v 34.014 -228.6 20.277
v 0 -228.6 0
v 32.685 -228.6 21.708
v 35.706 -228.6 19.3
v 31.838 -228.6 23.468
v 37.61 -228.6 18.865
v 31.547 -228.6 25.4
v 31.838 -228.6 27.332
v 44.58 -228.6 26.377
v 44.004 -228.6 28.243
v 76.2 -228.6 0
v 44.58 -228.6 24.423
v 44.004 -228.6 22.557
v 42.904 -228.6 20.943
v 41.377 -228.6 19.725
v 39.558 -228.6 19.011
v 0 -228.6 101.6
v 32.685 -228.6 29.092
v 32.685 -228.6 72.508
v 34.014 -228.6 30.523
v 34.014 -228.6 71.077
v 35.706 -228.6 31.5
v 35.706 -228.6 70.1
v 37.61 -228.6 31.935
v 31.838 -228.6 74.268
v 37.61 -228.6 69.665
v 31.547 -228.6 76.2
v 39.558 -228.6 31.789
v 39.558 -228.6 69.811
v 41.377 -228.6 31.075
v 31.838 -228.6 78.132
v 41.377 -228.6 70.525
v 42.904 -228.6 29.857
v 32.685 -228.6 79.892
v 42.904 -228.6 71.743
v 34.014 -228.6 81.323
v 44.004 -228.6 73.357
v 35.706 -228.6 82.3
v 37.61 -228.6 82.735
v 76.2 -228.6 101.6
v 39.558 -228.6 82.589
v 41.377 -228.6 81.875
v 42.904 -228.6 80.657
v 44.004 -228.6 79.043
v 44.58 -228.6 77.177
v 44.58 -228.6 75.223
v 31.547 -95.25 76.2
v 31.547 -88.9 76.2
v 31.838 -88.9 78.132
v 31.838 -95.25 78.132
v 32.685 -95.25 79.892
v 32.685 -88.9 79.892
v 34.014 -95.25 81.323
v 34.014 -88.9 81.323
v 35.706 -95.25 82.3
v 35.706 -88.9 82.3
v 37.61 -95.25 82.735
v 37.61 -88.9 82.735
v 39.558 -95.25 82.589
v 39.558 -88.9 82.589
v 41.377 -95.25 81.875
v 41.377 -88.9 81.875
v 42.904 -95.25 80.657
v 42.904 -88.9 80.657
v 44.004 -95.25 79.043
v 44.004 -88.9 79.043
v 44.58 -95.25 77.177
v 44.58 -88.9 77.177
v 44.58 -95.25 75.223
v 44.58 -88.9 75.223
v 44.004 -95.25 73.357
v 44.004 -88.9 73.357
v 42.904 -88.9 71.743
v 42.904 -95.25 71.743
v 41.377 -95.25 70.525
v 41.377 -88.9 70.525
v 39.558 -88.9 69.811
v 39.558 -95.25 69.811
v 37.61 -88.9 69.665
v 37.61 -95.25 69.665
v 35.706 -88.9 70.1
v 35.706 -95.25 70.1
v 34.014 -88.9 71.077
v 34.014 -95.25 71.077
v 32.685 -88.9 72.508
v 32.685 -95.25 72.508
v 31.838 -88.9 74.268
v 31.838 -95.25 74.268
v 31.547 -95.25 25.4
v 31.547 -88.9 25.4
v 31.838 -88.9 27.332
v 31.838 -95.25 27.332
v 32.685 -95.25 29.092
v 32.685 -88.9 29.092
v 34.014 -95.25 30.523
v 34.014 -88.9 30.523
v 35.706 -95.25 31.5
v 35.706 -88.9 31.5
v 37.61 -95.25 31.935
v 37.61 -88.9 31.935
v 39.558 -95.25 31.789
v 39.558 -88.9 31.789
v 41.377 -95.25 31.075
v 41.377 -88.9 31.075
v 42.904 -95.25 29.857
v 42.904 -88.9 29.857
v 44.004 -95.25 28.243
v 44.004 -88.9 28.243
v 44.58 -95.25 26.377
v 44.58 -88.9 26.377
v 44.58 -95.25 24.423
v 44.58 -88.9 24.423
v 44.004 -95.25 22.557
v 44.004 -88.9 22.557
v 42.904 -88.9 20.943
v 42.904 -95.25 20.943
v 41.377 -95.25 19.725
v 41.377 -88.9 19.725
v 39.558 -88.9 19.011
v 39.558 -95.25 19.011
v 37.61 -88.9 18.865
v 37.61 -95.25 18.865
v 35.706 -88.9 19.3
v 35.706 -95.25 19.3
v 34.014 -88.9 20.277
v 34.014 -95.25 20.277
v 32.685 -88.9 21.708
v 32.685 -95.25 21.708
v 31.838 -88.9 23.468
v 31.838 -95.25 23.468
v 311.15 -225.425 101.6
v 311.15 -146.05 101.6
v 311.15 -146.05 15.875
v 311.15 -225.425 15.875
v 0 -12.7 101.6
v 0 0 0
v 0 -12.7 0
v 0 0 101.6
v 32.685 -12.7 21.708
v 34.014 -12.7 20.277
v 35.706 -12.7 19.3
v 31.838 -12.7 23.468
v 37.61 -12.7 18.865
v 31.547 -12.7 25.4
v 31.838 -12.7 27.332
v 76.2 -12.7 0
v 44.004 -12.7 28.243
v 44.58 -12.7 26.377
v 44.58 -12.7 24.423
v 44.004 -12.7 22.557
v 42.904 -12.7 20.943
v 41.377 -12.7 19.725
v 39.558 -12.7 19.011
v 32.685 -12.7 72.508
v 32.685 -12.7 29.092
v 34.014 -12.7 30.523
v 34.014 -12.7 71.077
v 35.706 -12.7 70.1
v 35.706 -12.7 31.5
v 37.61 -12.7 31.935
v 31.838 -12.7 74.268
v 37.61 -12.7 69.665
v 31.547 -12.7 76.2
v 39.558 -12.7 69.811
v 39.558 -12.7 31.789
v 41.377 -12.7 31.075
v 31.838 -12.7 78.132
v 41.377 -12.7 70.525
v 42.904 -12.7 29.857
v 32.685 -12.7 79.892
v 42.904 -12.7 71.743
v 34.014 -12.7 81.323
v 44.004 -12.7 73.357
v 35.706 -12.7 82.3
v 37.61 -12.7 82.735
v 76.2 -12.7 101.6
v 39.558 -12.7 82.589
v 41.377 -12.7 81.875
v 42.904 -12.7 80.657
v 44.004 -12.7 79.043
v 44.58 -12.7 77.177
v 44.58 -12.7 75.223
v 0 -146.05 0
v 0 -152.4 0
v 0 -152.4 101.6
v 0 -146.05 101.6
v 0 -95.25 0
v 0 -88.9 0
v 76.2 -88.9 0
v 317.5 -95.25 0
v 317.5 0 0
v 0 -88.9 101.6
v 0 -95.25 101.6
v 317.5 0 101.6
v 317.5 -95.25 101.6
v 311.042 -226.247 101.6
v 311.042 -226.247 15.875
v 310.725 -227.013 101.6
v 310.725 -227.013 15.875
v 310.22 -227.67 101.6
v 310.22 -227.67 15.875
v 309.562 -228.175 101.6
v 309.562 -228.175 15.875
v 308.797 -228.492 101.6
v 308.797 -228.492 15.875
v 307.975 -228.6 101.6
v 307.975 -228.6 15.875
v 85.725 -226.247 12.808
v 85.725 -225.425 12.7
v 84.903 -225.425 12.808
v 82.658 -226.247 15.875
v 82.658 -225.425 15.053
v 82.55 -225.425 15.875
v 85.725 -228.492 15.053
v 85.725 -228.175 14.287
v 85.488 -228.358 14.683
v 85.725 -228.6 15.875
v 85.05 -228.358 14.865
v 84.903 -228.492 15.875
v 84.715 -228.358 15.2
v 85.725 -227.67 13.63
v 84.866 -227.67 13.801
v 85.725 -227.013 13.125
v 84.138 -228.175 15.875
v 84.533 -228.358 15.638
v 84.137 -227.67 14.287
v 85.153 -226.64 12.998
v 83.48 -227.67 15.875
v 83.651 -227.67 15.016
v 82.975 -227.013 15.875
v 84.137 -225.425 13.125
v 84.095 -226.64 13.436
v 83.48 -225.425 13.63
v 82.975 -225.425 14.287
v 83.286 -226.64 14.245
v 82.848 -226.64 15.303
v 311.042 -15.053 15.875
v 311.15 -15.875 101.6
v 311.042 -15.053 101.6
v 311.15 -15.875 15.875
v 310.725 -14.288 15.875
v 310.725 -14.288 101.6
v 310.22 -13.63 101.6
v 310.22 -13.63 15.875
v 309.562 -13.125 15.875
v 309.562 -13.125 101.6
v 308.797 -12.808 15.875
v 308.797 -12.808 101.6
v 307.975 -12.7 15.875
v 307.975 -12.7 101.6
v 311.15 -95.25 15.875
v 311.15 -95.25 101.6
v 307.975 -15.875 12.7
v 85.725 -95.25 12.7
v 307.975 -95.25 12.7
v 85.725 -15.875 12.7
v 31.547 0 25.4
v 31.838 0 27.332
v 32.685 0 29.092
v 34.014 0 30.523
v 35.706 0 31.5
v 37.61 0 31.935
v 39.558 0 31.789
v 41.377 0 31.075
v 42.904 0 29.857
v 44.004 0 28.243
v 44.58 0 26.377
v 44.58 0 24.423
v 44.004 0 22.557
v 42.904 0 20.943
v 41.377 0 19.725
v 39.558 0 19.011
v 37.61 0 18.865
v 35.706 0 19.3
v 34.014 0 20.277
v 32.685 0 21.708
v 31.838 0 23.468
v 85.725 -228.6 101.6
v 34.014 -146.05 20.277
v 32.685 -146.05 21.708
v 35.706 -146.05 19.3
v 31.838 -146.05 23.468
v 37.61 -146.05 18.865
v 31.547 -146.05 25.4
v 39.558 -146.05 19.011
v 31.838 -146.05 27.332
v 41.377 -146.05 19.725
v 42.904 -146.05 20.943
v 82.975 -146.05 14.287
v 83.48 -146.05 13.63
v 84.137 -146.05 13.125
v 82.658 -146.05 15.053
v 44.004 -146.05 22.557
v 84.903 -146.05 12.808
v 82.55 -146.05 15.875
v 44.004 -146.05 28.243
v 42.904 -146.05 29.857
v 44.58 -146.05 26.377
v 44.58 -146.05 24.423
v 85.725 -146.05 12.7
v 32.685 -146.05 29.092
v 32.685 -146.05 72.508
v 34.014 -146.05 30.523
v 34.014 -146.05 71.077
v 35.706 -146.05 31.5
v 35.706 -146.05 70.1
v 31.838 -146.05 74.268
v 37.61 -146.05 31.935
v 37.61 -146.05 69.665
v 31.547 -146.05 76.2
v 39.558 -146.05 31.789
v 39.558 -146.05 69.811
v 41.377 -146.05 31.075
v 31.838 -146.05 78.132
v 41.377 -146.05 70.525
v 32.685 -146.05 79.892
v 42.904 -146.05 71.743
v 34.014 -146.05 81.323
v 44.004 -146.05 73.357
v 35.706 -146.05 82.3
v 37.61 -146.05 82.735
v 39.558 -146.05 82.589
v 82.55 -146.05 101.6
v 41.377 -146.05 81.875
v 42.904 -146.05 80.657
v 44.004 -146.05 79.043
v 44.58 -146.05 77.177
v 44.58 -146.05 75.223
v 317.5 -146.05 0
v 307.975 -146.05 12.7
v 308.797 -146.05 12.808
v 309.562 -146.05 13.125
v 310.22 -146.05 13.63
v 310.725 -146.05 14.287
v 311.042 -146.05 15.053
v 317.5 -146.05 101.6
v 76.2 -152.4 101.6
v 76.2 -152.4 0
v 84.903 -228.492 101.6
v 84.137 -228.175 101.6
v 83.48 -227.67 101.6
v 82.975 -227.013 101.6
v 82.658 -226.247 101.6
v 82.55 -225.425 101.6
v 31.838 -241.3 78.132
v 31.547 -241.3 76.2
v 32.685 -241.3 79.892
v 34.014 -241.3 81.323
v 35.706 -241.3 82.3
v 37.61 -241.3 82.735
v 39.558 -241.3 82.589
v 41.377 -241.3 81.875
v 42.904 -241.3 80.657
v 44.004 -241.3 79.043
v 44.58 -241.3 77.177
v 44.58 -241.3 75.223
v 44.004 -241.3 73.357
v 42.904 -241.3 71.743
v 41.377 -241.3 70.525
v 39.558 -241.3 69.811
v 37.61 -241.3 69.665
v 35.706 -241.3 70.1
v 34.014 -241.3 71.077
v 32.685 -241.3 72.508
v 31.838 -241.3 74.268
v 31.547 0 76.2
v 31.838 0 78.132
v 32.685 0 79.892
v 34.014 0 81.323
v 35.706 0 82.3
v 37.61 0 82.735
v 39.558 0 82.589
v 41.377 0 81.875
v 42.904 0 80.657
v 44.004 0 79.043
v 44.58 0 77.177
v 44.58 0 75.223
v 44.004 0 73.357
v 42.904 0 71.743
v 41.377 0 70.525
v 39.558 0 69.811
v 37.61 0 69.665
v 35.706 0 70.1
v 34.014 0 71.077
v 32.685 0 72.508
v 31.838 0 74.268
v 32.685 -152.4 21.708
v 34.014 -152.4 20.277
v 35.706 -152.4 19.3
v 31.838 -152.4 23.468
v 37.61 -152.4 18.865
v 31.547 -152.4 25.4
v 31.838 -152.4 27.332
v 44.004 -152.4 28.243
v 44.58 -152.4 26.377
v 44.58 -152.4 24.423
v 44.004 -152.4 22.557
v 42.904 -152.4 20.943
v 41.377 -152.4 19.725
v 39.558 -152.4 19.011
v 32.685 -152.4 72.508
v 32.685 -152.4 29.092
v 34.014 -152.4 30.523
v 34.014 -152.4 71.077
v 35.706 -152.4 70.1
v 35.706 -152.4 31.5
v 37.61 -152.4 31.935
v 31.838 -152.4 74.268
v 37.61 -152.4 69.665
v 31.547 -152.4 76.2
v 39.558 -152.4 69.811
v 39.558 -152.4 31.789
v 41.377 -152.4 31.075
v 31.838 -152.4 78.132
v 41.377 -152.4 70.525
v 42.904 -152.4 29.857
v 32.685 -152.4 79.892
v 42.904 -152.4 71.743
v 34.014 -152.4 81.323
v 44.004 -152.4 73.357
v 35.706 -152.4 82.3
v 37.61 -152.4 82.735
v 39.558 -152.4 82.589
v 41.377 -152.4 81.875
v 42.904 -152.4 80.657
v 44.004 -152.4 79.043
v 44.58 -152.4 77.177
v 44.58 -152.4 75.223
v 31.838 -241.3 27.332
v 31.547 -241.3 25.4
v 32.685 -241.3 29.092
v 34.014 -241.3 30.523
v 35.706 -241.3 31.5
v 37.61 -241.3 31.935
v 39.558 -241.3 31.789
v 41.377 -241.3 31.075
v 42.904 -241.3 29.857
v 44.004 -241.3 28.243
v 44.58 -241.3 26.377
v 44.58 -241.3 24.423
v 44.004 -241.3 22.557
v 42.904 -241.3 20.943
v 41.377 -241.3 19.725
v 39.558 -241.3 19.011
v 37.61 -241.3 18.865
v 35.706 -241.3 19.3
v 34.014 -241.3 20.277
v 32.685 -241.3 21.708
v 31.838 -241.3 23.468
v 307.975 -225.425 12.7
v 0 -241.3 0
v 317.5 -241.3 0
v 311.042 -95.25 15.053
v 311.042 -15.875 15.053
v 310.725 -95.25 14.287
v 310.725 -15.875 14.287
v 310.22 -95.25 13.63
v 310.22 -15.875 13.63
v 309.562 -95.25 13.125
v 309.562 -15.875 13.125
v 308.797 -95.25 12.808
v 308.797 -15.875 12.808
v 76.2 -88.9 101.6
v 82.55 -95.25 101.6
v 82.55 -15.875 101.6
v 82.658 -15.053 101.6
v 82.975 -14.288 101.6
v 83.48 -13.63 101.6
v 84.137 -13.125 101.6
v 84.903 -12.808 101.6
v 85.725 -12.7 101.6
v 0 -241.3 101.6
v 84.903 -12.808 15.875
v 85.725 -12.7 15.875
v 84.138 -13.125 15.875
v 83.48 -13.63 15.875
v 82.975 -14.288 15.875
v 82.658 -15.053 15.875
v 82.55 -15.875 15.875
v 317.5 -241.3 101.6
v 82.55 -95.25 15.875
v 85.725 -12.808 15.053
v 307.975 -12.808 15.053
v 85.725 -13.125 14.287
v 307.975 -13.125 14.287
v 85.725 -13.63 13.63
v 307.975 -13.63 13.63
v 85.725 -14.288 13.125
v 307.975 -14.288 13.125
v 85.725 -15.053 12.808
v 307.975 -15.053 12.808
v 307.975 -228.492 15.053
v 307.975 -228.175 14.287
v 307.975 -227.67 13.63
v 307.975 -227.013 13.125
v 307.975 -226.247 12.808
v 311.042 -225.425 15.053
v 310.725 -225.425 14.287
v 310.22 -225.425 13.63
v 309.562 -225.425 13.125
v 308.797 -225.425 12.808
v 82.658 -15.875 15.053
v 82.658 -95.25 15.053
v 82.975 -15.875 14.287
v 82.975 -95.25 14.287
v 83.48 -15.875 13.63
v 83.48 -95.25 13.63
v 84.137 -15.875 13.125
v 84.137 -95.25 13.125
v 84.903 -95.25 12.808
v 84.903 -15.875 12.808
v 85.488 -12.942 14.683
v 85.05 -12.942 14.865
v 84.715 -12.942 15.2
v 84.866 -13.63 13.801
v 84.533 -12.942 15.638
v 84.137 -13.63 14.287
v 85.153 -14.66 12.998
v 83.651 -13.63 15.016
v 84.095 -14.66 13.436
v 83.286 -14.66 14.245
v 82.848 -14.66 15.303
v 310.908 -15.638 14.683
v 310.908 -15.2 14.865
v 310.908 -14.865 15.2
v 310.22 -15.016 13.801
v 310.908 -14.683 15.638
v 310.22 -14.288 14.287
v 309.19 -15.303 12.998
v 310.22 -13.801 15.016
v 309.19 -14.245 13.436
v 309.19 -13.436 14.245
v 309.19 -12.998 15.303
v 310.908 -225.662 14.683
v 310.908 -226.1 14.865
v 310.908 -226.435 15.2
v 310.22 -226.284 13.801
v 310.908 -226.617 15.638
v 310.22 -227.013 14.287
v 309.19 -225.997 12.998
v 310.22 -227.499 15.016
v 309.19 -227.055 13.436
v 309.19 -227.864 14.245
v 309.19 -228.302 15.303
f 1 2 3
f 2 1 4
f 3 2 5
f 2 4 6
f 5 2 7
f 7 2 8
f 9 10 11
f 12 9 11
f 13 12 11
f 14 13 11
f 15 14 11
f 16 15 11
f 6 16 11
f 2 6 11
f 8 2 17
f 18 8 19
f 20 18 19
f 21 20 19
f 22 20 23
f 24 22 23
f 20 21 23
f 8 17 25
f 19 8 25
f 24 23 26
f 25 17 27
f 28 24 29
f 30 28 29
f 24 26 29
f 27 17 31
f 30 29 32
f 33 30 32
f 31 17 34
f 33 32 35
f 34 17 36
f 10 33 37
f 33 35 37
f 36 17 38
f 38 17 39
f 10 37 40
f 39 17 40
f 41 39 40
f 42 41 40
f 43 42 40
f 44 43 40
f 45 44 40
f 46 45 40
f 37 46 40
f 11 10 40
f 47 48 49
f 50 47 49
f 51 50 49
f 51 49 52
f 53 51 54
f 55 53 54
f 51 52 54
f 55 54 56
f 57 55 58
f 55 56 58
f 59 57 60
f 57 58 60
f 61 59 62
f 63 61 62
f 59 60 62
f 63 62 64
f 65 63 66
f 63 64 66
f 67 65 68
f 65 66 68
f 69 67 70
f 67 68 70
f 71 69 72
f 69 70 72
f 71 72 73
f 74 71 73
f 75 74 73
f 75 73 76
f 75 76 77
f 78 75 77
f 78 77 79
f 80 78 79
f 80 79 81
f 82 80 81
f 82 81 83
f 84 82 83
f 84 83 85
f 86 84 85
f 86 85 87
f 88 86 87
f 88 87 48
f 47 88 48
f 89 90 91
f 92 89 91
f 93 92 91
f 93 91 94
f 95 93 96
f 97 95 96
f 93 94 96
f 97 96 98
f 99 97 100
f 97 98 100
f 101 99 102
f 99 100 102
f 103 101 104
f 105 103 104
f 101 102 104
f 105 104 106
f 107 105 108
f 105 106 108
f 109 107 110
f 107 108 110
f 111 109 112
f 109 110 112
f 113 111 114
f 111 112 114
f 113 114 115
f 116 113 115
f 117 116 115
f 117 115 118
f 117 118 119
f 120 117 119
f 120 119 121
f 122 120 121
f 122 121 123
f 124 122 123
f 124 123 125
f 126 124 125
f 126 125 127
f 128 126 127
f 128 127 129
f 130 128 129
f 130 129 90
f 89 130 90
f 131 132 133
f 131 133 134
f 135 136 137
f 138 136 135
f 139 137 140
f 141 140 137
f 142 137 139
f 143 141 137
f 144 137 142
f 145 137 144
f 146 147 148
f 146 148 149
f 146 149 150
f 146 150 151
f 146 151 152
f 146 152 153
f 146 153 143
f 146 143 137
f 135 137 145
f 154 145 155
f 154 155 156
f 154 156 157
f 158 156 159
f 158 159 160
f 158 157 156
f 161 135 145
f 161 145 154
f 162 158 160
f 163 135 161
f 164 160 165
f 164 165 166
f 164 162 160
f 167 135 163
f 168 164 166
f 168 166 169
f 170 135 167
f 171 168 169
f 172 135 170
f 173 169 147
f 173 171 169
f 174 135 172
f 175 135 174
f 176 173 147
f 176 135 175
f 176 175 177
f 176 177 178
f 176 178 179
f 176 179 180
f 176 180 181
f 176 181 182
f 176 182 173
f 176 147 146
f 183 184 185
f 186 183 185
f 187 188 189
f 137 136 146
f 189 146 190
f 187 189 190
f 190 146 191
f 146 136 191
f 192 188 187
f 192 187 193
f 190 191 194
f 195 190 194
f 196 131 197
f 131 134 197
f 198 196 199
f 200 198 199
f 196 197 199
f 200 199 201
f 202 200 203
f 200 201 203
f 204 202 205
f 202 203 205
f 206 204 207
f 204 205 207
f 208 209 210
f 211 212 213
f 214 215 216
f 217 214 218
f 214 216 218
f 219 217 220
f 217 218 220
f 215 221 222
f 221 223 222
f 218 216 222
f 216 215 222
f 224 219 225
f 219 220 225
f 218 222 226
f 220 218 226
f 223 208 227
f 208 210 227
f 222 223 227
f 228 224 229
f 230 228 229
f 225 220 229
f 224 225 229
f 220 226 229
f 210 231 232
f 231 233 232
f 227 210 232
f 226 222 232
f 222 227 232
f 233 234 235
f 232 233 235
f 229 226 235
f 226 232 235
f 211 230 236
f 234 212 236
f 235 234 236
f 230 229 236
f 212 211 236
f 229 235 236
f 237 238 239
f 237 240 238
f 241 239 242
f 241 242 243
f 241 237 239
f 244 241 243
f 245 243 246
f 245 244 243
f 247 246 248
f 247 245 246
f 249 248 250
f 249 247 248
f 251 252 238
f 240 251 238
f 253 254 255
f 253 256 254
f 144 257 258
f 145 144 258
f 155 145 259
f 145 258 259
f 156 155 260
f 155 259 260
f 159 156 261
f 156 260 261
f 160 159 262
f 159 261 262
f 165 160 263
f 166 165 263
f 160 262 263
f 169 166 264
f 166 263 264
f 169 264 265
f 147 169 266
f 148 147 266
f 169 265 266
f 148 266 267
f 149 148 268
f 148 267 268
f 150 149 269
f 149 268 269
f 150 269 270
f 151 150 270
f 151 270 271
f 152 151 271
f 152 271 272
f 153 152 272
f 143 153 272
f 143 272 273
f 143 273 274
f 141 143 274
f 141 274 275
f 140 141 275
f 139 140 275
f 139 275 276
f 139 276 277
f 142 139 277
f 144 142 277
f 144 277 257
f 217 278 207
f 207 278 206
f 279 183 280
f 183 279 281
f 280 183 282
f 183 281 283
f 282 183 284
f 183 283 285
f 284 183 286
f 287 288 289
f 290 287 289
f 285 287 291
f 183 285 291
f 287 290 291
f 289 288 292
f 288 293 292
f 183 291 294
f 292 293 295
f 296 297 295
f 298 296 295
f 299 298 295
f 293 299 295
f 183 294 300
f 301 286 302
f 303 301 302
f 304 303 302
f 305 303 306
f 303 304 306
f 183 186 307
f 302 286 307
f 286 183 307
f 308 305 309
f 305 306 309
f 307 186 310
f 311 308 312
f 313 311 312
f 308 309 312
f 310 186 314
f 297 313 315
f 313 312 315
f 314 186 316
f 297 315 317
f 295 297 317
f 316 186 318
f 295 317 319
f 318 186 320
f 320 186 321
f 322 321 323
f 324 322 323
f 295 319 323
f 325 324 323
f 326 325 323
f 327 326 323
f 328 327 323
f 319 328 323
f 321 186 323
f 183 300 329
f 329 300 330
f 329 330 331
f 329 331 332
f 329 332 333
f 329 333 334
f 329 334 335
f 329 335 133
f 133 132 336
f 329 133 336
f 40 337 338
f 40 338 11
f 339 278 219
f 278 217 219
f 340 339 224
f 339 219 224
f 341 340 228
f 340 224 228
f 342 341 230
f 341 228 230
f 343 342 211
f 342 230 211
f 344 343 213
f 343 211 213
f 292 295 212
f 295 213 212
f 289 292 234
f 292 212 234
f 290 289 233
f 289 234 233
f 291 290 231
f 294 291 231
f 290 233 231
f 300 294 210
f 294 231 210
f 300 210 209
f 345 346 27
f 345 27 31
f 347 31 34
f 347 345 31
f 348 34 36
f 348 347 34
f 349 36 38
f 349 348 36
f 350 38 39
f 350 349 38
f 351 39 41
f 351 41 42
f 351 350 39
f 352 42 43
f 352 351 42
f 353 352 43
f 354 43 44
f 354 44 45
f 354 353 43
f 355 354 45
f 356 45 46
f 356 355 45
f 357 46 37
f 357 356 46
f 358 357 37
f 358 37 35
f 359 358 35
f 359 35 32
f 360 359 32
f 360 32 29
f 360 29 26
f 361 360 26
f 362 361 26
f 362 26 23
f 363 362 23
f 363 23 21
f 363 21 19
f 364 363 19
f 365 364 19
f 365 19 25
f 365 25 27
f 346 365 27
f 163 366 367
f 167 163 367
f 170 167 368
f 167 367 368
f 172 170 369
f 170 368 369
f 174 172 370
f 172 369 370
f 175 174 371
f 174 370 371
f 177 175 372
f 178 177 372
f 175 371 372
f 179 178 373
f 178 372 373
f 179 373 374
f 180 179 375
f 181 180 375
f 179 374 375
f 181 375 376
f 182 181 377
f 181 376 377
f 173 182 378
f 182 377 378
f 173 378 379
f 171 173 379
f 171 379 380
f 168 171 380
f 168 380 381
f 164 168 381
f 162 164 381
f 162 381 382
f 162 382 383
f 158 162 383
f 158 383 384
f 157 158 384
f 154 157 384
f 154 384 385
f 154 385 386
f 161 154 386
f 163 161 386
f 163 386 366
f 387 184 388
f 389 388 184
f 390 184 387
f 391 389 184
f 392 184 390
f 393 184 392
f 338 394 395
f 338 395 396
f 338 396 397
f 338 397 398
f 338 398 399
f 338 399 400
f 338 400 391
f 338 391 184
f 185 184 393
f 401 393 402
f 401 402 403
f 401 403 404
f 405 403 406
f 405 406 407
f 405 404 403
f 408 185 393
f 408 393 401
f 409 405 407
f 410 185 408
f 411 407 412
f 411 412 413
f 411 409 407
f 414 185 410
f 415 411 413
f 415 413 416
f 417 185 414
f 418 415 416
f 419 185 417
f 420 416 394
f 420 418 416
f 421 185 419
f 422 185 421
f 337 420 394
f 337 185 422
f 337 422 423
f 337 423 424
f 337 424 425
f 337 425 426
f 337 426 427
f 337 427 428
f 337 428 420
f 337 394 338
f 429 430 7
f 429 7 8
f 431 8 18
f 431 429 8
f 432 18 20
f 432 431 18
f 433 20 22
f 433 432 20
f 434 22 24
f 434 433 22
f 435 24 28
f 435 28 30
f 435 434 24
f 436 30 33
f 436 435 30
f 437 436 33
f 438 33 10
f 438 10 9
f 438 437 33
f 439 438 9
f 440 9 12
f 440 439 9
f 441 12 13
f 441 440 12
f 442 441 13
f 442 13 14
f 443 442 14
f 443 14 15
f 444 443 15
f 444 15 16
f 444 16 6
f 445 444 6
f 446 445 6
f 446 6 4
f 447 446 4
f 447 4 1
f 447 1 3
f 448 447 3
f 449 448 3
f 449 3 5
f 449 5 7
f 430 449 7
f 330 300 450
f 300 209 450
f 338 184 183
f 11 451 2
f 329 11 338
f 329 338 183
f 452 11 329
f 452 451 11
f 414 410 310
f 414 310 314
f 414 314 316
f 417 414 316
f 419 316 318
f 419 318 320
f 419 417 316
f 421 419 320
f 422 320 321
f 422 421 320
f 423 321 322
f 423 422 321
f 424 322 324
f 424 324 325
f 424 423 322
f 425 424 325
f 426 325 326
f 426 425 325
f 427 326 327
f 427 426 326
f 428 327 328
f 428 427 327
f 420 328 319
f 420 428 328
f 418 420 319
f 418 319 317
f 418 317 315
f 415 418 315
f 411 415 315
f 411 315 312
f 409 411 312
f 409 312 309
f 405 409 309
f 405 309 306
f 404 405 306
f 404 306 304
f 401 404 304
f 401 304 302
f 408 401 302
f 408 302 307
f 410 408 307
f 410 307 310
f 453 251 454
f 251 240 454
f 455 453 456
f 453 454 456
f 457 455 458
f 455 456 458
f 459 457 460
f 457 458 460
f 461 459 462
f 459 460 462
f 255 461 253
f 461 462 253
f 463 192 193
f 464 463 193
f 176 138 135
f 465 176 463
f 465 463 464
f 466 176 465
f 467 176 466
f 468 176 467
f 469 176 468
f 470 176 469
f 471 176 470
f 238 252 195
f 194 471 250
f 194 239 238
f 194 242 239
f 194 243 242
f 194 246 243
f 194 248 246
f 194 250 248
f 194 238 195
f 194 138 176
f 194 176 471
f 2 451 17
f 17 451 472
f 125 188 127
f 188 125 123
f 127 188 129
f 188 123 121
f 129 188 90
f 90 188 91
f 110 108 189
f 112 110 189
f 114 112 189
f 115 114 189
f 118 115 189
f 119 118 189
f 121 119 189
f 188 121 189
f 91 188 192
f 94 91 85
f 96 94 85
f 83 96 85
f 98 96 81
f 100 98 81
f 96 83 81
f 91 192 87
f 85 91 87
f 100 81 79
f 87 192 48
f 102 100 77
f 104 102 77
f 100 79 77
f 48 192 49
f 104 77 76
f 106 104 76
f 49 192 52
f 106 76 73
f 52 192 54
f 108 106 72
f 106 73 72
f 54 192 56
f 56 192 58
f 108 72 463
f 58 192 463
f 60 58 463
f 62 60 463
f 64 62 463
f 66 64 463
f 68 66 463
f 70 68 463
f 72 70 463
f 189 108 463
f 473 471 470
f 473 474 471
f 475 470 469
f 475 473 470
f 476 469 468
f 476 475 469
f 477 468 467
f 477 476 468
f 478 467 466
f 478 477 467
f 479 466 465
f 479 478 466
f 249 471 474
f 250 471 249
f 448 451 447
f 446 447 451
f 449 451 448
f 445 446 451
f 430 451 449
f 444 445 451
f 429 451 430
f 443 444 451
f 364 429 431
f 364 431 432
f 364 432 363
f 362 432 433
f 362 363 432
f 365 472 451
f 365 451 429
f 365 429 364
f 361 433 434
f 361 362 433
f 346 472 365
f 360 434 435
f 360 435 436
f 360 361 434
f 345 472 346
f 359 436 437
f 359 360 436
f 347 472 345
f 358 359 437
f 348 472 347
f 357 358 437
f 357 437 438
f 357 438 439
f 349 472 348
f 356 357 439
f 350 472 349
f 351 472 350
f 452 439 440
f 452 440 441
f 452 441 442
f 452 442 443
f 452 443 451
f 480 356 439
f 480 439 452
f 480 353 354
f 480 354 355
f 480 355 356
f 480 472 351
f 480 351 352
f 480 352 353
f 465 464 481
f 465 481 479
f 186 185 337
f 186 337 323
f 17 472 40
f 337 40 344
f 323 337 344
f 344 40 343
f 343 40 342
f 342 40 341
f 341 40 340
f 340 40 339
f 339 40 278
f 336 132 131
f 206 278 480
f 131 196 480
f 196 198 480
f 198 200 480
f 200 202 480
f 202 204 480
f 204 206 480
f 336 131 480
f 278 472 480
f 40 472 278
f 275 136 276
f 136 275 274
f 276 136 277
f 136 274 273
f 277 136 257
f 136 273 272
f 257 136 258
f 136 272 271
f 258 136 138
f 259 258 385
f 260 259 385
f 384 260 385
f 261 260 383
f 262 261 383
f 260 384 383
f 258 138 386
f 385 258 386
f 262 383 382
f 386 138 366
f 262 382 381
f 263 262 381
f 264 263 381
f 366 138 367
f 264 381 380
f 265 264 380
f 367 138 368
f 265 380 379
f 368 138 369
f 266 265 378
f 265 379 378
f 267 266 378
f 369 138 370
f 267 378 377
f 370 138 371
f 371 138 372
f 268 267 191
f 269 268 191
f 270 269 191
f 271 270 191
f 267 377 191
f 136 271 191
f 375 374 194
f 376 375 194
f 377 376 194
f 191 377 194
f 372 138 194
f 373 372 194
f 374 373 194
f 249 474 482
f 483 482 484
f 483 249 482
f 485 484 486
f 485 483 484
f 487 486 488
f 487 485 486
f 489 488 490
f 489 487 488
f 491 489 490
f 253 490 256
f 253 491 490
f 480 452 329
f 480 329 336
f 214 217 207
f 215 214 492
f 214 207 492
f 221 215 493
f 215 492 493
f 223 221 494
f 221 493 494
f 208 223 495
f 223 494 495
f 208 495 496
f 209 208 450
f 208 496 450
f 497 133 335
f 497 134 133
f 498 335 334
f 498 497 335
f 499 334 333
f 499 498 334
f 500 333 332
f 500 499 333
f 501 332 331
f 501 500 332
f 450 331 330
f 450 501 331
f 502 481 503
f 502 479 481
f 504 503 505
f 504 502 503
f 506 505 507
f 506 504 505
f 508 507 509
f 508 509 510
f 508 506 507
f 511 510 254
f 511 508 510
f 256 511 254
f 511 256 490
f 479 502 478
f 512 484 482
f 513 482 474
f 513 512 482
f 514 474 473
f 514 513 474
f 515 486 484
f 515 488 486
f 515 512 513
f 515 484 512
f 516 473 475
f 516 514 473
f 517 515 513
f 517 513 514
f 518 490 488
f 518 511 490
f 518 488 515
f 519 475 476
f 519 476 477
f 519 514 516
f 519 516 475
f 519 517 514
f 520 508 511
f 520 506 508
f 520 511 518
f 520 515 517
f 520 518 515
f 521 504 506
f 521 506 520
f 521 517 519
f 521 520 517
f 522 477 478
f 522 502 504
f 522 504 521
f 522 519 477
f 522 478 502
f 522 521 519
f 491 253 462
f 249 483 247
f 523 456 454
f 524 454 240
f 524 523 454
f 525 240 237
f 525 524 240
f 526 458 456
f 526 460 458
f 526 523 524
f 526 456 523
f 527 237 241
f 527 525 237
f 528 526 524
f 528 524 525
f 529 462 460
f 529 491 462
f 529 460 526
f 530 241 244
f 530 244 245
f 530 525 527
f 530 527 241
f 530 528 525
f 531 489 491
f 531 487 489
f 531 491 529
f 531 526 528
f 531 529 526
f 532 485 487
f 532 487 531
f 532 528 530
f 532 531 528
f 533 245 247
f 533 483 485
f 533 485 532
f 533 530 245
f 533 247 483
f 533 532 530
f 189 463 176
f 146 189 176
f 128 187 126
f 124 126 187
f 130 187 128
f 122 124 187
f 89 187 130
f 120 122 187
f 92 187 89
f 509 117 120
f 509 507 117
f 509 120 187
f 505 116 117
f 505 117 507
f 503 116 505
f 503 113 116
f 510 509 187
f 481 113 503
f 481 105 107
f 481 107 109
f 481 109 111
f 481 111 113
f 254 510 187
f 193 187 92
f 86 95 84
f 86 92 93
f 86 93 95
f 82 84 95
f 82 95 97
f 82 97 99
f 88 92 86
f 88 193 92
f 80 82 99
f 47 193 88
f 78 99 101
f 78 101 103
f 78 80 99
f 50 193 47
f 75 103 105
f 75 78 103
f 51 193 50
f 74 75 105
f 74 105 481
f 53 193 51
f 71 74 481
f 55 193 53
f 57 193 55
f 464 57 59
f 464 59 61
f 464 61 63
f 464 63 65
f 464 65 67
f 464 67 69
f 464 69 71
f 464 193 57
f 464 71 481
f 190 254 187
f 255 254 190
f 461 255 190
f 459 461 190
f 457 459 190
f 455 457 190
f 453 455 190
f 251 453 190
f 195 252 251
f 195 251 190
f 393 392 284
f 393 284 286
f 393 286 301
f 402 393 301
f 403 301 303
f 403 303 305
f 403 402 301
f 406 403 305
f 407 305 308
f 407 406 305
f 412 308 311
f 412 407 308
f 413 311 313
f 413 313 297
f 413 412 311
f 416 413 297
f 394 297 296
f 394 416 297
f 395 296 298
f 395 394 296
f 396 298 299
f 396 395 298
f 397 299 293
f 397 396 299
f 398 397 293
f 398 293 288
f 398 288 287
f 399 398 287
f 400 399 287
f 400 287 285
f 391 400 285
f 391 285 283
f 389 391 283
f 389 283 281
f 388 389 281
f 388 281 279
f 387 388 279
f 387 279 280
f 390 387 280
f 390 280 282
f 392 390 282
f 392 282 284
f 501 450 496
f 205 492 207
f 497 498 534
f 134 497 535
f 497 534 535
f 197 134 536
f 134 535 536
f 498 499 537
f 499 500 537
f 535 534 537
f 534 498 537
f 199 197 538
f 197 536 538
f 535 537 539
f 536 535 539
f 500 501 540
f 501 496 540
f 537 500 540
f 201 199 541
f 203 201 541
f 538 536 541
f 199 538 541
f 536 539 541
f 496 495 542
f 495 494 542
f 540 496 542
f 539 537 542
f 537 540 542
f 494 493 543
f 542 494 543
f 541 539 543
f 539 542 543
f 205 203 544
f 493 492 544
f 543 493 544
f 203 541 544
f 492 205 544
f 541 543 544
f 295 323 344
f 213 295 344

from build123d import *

# Parameters (mm, degrees)
F0_W     = 317.5
F0_H     = 101.6
F1_DEPTH = 95.25
F2_W     = 76.2
F2_H     = 76.2
F3_DEPTH = 101.601
F4_W     = 228.6
F4_H     = 82.55
F5_DEPTH = 88.9
F6_R     = 3.175
F8_D     = 13.1064


with BuildPart() as f1:
    # F0 (on Front) → F1 (new body)
    with BuildSketch(Plane.XZ):
        with Locations((158.75, 50.8)):
            Rectangle(F0_W, F0_H)
    extrude(amount=F1_DEPTH)

    # F2 (on face) → F3 (cut, through all)
    with BuildSketch(Plane.XY.offset(101.6)):
        with Locations((38.1, -50.8)):
            Rectangle(F2_W, F2_H)
    extrude(amount=-F3_DEPTH, mode=Mode.SUBTRACT)

    # F4 (on face) → F5 (cut)
    with BuildSketch(Plane.XY.offset(101.6)):
        with Locations((196.85, -53.975)):
            Rectangle(F4_W, F4_H)
    extrude(amount=-F5_DEPTH, mode=Mode.SUBTRACT)

    # F6
    f6_edges = [f1.edges().sort_by_distance(p)[0] for p in [
        (82.55, -53.975, 12.7),
        (196.85, -12.7, 12.7),
        (311.15, -53.975, 12.7),
        (311.15, -12.7, 57.15),
        (82.55, -12.7, 57.15),
    ]]
    fillet(f6_edges, radius=F6_R)

    # F8 (through all)
    with Locations(Plane.XZ.offset(95.25)):
        with Locations((38.1, 76.2), (38.1, 25.4)):
            Hole(F8_D / 2)


with BuildPart() as f10_1:
    # F10: instance of F1
    add(f1.part.mirror(Plane(origin=(95.2048569335, -120.65, 39.7279895919), x_dir=(1, 0, 0), z_dir=(0, -1, 0))))


solid = Compound([f1.part, f10_1.part])
